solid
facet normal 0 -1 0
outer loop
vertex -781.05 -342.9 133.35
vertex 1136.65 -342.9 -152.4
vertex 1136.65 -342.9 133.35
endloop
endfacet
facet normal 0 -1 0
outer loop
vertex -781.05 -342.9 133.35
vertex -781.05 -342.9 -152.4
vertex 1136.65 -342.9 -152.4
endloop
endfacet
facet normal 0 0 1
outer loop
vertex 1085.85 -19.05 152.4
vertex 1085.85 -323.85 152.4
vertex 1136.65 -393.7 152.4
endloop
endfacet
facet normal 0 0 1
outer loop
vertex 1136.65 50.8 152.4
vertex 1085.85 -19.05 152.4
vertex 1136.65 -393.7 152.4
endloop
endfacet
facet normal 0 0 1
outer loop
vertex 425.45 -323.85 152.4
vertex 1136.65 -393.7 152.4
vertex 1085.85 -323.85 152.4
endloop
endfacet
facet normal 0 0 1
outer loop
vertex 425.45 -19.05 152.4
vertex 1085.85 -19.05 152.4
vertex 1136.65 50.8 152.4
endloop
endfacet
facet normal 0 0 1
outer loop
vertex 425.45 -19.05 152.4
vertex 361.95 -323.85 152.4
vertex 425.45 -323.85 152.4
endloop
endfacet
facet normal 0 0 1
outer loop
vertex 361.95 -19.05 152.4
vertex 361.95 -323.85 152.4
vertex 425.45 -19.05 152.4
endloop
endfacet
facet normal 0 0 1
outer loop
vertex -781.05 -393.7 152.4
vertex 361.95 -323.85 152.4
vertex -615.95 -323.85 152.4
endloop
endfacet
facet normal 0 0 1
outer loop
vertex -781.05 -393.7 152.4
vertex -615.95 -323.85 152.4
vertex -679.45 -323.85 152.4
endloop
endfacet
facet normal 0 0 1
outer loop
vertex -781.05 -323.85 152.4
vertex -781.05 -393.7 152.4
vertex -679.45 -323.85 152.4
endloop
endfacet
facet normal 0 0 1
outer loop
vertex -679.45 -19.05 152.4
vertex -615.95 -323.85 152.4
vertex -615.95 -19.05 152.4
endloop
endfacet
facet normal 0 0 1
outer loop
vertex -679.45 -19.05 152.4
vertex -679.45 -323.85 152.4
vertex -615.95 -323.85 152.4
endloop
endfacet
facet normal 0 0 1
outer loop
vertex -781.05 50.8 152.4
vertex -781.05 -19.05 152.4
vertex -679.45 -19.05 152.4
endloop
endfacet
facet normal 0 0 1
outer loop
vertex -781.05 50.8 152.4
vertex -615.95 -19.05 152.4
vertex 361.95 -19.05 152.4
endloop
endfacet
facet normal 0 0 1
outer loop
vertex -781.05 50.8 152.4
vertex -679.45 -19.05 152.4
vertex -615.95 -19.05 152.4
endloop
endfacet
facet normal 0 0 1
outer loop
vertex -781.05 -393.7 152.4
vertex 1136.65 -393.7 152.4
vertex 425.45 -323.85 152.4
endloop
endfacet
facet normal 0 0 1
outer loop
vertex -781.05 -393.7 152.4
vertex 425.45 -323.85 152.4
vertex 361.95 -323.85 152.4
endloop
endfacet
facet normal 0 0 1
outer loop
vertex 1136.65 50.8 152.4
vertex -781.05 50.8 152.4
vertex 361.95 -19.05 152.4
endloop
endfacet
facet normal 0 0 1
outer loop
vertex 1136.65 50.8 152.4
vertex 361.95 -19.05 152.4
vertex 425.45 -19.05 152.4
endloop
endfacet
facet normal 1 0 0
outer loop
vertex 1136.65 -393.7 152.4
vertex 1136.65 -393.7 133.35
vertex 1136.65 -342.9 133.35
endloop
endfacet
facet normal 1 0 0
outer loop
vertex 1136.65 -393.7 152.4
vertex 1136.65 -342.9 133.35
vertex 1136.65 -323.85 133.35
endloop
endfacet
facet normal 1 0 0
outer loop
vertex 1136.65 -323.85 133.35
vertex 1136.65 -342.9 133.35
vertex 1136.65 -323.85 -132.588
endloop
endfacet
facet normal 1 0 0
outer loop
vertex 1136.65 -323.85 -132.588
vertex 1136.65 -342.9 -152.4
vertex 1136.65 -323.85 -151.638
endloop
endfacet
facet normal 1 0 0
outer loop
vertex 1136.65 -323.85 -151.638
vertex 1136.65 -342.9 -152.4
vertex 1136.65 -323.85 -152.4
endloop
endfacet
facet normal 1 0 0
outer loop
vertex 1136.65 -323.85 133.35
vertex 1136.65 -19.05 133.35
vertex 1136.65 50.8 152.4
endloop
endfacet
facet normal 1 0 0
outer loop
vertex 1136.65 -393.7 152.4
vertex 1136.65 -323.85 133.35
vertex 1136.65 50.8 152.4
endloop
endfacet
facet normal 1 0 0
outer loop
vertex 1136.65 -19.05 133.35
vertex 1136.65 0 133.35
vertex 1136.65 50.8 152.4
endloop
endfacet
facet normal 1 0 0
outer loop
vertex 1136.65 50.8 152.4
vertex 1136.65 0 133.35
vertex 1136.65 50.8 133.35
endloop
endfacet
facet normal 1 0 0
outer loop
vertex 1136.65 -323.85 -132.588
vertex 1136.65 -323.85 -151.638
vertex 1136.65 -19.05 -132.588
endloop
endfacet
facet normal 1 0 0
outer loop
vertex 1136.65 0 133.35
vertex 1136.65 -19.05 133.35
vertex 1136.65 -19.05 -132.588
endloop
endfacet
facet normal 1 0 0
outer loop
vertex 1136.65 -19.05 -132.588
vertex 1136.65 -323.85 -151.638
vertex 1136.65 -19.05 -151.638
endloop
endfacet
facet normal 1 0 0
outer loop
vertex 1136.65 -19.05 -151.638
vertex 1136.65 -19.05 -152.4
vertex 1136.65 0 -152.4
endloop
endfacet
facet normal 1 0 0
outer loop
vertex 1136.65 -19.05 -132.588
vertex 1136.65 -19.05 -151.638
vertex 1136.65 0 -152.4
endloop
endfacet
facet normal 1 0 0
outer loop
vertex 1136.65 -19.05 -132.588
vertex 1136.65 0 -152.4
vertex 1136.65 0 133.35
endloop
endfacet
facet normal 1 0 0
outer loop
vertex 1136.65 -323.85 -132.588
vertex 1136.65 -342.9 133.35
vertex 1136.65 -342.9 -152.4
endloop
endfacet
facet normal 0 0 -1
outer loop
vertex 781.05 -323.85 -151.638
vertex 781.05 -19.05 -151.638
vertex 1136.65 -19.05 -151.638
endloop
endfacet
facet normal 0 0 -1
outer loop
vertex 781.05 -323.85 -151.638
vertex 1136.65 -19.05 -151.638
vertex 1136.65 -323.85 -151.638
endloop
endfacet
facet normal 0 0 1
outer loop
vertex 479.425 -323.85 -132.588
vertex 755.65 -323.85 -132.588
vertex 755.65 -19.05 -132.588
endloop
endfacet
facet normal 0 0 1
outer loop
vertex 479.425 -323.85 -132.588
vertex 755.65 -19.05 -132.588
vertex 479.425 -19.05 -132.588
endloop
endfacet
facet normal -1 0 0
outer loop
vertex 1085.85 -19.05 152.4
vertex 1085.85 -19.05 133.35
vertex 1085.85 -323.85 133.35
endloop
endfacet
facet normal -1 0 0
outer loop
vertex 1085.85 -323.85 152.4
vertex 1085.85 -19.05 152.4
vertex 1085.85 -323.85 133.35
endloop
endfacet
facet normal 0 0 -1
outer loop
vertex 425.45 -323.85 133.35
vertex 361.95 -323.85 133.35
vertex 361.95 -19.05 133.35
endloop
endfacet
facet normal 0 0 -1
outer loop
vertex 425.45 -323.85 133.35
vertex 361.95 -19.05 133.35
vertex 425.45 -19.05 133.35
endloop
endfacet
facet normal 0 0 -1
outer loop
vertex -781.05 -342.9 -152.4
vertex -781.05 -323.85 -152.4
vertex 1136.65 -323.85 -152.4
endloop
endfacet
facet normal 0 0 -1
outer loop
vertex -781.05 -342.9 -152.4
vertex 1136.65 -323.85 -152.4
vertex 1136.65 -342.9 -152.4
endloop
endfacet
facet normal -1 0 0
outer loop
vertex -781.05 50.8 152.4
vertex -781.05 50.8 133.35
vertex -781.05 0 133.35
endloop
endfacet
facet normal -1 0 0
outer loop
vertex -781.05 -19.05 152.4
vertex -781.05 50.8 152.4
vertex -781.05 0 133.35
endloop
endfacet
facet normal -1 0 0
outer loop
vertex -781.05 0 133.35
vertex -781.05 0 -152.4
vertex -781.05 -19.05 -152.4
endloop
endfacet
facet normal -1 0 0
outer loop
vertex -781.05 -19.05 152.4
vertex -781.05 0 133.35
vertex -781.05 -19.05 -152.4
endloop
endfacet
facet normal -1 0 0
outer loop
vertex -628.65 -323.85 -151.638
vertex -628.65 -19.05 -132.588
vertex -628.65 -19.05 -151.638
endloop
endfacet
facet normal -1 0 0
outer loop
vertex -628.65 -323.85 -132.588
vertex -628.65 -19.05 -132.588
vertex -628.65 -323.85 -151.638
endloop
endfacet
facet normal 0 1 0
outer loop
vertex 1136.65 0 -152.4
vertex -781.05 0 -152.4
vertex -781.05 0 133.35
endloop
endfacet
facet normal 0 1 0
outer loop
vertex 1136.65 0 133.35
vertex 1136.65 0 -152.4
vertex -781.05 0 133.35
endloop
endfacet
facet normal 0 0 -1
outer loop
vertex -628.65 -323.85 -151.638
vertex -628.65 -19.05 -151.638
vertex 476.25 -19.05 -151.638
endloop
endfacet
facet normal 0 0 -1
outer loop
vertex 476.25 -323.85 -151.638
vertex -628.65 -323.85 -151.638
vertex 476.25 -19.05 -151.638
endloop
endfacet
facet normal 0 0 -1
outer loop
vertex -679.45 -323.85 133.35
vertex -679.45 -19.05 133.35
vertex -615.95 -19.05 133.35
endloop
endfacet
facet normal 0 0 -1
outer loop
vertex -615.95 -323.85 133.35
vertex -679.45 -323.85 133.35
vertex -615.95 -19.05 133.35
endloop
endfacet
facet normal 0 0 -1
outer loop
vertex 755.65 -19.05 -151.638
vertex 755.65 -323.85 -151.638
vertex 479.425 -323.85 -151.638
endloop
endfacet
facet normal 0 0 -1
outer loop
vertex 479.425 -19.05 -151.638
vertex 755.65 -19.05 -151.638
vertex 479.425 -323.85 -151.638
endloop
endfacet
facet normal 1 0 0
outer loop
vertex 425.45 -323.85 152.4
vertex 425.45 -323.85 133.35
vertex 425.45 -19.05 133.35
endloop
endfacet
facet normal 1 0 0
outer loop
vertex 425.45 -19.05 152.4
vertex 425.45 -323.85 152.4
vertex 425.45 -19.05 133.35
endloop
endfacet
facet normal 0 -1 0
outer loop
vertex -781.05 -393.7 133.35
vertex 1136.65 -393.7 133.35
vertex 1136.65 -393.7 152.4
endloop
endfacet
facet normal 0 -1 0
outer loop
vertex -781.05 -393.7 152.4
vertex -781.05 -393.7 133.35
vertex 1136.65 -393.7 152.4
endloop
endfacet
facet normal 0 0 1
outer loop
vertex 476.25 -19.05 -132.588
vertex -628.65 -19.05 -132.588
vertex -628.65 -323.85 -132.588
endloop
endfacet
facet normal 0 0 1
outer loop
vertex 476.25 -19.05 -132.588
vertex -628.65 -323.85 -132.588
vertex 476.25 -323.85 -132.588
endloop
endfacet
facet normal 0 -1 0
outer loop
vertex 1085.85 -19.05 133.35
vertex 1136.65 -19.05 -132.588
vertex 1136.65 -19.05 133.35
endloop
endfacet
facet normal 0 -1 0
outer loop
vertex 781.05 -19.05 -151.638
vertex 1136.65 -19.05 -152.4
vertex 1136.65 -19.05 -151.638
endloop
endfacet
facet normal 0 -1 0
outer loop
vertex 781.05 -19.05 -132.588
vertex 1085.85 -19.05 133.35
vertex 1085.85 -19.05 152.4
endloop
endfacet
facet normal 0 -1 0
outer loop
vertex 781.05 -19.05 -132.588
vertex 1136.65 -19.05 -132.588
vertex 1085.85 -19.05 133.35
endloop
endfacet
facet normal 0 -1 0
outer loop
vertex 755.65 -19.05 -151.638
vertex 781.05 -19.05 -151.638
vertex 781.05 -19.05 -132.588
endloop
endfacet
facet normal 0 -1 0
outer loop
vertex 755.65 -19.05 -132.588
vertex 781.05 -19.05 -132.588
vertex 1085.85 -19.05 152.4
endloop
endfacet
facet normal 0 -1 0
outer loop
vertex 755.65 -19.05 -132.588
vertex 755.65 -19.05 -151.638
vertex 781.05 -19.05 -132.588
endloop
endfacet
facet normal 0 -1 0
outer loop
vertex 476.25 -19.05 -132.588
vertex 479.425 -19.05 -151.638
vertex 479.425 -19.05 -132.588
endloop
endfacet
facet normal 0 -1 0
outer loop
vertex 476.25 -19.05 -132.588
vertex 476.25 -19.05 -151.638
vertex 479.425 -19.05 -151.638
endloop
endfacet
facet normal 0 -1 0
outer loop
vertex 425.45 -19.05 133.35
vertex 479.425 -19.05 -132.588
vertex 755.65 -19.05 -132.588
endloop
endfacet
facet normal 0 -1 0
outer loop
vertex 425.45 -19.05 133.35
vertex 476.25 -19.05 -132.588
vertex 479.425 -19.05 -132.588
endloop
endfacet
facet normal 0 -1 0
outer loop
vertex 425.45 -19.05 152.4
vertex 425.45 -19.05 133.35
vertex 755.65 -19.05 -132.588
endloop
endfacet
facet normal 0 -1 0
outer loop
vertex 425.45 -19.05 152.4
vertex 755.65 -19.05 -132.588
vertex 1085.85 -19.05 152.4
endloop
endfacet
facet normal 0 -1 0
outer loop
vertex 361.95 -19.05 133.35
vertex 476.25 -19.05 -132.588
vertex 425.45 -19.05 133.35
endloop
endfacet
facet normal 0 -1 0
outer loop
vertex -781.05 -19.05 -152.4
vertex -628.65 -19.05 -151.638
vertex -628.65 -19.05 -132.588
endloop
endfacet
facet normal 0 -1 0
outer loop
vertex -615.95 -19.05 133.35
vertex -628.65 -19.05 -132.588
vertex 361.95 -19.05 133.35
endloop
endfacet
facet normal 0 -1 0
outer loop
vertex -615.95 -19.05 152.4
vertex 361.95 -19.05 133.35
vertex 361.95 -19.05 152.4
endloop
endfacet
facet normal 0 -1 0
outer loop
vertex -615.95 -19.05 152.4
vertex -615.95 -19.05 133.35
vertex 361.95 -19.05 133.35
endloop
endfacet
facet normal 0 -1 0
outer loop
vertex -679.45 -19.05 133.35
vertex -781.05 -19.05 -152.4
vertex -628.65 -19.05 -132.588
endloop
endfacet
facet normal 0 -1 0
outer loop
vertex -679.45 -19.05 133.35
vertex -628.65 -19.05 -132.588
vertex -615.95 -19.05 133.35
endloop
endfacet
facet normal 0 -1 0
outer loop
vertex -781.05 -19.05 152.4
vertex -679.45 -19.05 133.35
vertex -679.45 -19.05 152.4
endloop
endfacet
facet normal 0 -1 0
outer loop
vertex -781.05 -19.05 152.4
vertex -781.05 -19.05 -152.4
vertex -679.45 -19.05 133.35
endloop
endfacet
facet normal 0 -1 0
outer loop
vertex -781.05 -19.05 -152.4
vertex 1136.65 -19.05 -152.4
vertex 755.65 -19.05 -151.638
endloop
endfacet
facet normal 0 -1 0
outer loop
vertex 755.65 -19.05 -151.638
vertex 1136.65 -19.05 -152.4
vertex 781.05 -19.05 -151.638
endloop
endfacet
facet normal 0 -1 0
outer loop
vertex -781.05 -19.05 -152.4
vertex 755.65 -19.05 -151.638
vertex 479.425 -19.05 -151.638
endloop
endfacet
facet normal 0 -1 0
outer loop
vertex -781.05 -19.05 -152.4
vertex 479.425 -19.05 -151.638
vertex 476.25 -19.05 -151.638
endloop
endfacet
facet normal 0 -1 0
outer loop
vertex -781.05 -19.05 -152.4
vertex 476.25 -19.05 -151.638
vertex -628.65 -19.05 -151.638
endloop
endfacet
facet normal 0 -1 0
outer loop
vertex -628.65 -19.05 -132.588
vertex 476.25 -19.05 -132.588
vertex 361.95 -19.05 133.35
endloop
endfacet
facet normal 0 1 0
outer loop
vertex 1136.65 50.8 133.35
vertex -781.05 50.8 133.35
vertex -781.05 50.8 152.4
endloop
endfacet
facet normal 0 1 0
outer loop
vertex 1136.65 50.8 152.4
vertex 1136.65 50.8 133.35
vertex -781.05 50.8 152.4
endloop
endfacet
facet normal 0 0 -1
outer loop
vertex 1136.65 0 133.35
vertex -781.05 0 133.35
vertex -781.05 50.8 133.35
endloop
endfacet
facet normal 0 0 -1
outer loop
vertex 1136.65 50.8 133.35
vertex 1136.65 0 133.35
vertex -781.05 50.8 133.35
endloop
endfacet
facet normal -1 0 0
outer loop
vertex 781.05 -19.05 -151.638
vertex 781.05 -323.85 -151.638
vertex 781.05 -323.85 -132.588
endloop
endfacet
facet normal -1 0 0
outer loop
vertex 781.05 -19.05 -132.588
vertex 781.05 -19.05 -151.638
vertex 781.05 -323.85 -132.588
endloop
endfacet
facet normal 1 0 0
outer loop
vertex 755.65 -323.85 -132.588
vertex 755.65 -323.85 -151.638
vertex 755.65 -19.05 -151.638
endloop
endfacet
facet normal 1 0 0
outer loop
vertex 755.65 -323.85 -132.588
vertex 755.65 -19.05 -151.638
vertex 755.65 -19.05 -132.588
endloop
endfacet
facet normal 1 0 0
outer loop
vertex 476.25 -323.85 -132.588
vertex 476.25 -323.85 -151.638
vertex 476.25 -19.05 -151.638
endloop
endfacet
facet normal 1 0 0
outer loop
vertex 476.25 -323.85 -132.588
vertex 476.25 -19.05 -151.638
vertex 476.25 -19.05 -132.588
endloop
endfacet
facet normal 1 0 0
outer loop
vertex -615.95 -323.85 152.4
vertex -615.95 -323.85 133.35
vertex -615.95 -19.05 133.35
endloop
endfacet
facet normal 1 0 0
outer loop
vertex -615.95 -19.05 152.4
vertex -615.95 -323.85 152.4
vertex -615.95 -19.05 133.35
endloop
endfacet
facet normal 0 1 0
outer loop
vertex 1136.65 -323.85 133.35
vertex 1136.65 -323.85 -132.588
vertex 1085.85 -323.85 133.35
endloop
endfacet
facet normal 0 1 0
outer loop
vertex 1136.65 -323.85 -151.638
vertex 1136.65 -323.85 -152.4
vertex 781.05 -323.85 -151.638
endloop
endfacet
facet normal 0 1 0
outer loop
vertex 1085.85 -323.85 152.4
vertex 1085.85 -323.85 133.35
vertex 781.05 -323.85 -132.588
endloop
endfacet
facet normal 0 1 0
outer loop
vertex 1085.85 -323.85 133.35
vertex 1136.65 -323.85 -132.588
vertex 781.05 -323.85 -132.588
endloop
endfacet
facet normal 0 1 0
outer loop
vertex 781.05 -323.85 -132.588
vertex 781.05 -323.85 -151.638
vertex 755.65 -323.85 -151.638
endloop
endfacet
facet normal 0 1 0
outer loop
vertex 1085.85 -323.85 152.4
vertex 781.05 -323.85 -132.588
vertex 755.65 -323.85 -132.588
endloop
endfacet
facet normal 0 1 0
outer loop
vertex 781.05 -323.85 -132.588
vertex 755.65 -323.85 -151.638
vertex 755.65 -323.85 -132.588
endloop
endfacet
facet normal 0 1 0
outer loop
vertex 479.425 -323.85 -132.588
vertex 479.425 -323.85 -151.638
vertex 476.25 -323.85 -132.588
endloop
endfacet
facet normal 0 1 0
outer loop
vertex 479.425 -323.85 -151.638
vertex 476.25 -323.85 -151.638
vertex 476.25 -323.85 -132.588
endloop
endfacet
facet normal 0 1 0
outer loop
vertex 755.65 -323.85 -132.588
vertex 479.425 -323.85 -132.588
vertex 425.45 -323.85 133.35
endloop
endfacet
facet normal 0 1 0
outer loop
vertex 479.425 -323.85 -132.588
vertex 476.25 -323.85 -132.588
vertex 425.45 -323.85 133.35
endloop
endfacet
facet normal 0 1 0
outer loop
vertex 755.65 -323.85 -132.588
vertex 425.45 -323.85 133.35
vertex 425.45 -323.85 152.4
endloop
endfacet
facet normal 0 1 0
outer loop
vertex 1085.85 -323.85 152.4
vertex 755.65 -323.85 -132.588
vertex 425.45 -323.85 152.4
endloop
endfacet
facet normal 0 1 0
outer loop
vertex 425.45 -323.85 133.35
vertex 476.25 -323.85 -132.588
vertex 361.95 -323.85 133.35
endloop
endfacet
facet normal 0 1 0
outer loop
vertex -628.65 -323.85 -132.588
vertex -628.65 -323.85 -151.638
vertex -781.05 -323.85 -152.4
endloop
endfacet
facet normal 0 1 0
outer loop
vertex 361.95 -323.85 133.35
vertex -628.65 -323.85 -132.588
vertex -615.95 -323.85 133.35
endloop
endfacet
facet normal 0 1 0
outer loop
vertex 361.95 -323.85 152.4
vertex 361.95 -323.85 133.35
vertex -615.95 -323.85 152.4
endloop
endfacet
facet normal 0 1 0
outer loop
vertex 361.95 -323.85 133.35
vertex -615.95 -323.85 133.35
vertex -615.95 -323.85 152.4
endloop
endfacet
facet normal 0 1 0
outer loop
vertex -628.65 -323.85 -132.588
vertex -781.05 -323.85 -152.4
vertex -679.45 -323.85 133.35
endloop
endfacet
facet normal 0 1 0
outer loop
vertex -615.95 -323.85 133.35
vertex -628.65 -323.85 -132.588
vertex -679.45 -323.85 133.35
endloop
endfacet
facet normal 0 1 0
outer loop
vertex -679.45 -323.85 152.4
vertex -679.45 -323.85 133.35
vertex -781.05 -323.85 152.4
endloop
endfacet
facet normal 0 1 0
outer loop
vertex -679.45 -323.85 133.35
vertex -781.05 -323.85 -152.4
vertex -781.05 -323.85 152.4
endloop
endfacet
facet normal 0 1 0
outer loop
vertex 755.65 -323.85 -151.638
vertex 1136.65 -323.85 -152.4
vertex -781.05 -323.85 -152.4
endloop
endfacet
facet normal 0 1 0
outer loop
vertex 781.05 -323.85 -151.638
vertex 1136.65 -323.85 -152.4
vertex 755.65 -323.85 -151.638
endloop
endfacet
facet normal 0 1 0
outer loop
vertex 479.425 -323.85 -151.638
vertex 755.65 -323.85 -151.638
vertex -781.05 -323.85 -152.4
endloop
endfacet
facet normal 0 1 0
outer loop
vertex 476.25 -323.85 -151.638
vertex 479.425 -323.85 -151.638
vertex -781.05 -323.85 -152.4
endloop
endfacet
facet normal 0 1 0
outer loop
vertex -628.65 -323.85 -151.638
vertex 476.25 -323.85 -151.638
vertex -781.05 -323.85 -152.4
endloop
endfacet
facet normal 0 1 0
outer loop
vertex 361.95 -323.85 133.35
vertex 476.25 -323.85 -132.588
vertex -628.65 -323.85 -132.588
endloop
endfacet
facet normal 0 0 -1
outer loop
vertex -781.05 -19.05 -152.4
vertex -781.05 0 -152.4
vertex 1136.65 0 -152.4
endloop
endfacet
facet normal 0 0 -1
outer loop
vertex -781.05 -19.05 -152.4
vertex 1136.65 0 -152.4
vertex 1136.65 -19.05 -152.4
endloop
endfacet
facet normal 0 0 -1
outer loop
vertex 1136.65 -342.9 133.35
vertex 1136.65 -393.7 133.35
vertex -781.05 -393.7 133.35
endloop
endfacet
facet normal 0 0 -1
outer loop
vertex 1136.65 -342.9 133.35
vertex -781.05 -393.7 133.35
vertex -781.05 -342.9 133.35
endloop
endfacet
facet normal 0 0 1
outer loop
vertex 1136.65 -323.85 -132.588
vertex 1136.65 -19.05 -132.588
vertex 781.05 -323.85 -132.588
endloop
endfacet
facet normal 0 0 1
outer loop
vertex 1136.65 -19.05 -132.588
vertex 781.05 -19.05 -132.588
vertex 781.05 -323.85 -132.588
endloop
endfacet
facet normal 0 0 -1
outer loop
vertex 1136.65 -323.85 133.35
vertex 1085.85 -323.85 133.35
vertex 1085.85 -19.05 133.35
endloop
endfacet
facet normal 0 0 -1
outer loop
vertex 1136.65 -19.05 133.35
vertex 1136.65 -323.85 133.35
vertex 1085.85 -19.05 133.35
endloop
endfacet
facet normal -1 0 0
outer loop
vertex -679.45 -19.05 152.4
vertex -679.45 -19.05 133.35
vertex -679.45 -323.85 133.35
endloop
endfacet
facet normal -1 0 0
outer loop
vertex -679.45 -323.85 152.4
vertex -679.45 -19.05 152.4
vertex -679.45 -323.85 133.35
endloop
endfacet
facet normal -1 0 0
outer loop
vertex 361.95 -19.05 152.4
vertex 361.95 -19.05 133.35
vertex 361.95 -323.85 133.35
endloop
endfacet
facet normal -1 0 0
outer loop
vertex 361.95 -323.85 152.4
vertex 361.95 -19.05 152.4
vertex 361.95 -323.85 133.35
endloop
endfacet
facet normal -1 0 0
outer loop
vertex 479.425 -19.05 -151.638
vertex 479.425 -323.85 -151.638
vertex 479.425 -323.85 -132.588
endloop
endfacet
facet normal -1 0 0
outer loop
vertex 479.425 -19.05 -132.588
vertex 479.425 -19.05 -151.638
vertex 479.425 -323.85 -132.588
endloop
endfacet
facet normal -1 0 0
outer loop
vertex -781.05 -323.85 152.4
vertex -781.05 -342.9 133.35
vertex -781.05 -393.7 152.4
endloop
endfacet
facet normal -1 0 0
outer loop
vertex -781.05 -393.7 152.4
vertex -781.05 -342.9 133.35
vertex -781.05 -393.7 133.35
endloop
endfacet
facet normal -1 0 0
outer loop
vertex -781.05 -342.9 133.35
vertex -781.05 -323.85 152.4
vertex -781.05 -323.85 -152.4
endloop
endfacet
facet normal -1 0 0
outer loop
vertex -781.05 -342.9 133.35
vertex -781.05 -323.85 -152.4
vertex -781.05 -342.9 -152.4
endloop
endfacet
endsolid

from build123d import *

# Parameters (mm, degrees)
F0_W      = 1663.7
F0_H      = 304.8
F1_DEPTH  = 19.05
F2_W      = 50.8
F2_H      = 19.05
F3_DEPTH  = 304.8
F4_W      = 1308.1
F4_H      = 19.05
F5_DEPTH  = 304.8
F7_DEPTH  = 19.05
F8_DEPTH  = 19.05
F9_DEPTH  = 19.05
F11_DEPTH = 19.05
F12_W     = 276.225
F12_H     = 19.05
F13_DEPTH = 304.8
F14_DEPTH = 50.8
F15_DEPTH = 304.8
F16_DEPTH = 304.8
F17_W     = 304.8
F17_H     = 19.05
F18_DEPTH = 152.4


with BuildPart() as f1:
    # F0 (on Front) → F1 (new body)
    with BuildSketch(Plane.XZ):
        Rectangle(F0_W, F0_H)
    extrude(amount=F1_DEPTH)

    # F2 (on face) → F3 (join)
    with BuildSketch(Plane.XZ.offset(19.05)):
        with Locations((806.45, -142.113)):
            Rectangle(F2_W, F2_H)
    extrude(amount=F3_DEPTH)

    # F4 (on face) → F5 (join)
    with BuildSketch(Plane.XZ.offset(19.05)):
        with Locations((-177.8, -142.113)):
            Rectangle(F4_W, F4_H)
    extrude(amount=F5_DEPTH)

    # F6 (on face) → F7 (join)
    with BuildSketch(Plane.XZ.offset(323.85)):
        Polygon((-831.85, 152.4), (-831.85, -151.638), (-831.85, -152.4), (831.85, -152.4), (831.85, 152.4), align=None)
    extrude(amount=F7_DEPTH)

    # F8 (cut): a face of the model
    f8_faces = [f1.faces().sort_by_distance(p)[0] for p in [
        (0, -333.375, 152.4),
    ]]
    extrude(f8_faces, amount=-F8_DEPTH, mode=Mode.SUBTRACT)

    # F9 (cut): a face of the model
    f9_faces = [f1.faces().sort_by_distance(p)[0] for p in [
        (0, -9.525, 152.4),
    ]]
    extrude(f9_faces, amount=-F9_DEPTH, mode=Mode.SUBTRACT)

    # F10 (on face) → F11 (join)
    with BuildSketch(Plane.XY.offset(133.35)):
        Polygon((831.85, -393.7), (831.85, -342.9), (831.85, -323.85), (831.85, -19.05), (781.05, -19.05), (781.05, -323.85), (425.45, -323.85), (425.45, -19.05), (361.95, -19.05), (361.95, -323.85), (-615.95, -323.85), (-679.45, -323.85), (-831.85, -323.85), (-831.85, -393.7), align=None)
        Polygon((781.05, -19.05), (831.85, -19.05), (831.85, 50.8), (-831.85, 50.8), (-831.85, -19.05), (-679.45, -19.05), (-679.45, -323.85), (-615.95, -323.85), (-615.95, -19.05), (361.95, -19.05), (425.45, -19.05), align=None)
    extrude(amount=F11_DEPTH)

    # F12 (on face) → F13 (join)
    with BuildSketch(Plane(origin=(0, -323.85, 0), x_dir=(-1, 0, 0), z_dir=(0, 1, 0))):
        with Locations((-617.5375, -142.113)):
            Rectangle(F12_W, F12_H)
    extrude(amount=F13_DEPTH)

    # F14 (cut): a face of the model
    f14_faces = [f1.faces().sort_by_distance(p)[0] for p in [
        (-831.85, -329.2396501742, 9.906),
    ]]
    extrude(f14_faces, amount=-F14_DEPTH, mode=Mode.SUBTRACT)

    # F15 (add): a face of the model
    f15_faces = [f1.faces().sort_by_distance(p)[0] for p in [
        (831.85, -329.2396501742, -152.019),
    ]]
    extrude(f15_faces, amount=F15_DEPTH)

    # F16 (cut): a face of the model
    f16_faces = [f1.faces().sort_by_distance(p)[0] for p in [
        (781.05, -171.45, 142.875),
    ]]
    extrude(f16_faces, amount=-F16_DEPTH, mode=Mode.SUBTRACT)

    # F17 (on face) → F18 (cut)
    with BuildSketch(Plane(origin=(-781.05, 0, 0), x_dir=(0, -1, 0), z_dir=(-1, 0, 0))):
        with Locations((171.45, -142.113)):
            Rectangle(F17_W, F17_H)
    extrude(amount=-F18_DEPTH, mode=Mode.SUBTRACT)


solid = f1.part
